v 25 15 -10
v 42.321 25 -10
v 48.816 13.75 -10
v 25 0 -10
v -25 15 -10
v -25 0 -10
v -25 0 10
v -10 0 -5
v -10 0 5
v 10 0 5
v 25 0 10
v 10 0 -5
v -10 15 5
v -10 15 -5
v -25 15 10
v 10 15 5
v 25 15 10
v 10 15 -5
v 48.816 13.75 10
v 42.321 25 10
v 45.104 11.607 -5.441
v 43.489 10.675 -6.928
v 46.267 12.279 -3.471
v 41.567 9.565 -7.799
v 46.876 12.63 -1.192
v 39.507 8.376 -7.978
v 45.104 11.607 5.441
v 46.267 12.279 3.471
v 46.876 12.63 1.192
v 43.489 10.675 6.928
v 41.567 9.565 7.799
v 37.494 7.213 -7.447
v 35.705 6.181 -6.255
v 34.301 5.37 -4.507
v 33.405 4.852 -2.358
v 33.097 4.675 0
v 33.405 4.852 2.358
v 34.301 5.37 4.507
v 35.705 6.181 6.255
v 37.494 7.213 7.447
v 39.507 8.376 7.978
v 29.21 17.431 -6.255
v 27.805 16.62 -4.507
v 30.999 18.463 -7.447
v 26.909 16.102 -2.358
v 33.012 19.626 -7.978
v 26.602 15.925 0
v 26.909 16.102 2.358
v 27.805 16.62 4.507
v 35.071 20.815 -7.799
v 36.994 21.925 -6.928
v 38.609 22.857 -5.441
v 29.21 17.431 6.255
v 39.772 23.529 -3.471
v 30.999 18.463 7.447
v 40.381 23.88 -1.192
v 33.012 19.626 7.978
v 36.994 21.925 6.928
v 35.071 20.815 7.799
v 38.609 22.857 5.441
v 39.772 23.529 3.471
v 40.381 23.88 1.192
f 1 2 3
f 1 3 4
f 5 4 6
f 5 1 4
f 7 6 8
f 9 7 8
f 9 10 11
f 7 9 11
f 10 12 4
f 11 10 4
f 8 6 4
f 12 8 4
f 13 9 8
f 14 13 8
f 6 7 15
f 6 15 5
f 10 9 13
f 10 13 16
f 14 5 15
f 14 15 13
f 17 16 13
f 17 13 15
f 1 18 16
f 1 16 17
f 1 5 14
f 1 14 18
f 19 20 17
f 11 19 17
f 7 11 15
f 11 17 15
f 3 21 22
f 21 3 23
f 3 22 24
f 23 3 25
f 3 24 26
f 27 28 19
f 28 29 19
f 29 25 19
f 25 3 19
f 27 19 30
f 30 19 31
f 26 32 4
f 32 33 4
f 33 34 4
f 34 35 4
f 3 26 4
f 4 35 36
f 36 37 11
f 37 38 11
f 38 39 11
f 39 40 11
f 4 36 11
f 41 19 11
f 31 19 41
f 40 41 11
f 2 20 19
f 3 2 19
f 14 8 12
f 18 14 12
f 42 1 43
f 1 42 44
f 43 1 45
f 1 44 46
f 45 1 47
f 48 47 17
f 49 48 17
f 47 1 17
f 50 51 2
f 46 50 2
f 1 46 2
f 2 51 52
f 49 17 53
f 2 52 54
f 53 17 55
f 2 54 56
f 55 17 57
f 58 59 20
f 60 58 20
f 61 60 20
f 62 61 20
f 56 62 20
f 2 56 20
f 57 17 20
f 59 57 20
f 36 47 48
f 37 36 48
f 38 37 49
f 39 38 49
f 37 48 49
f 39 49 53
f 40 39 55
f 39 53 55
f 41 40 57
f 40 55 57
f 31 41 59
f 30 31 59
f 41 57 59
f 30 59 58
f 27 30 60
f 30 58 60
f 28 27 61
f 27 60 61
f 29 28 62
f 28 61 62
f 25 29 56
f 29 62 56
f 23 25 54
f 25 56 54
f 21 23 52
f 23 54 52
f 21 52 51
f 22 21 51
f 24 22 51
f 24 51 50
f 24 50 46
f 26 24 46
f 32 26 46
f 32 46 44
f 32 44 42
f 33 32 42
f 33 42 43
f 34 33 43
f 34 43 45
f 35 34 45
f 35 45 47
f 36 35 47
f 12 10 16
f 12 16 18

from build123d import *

# Parameters (mm, degrees)
SKETCH_1_W          = 50
SKETCH_1_H          = 20
SKETCH_1_W_2        = 20
SKETCH_1_H_2        = 10
EXTRUDE_1_DEPTH     = 15
EXTRUDE_2_DEPTH     = 20
SKETCH_3_R          = 8
CUT_EXTRUDE_1_DEPTH = 56.775595694


with BuildPart() as part:
    # 草图1 → 凸台-拉伸1 (new body)
    with BuildSketch(Plane(origin=(0, 0, 0), x_dir=(1, 0, 0), z_dir=(0, 1, 0))):
        Rectangle(SKETCH_1_W, SKETCH_1_H)
        Rectangle(SKETCH_1_W_2, SKETCH_1_H_2, mode=Mode.SUBTRACT)
    extrude(amount=EXTRUDE_1_DEPTH)

    # 草图2 → 凸台-拉伸2 (add)
    with BuildSketch(Plane.XY.offset(10)):
        Polygon((25, 15), (42.320508076, 25), (48.815698604, 13.75), (25, 0), align=None)
    extrude(amount=-EXTRUDE_2_DEPTH)

    # 草图3 → 切除-拉伸1 (cut, through all)
    with BuildSketch(Plane(origin=(-0.245190528, 0.424682453, 0), x_dir=(0.8660254037844378, 0.5000000000000017, 0), z_dir=(-0.5000000000000016, 0.8660254037844377, 0))):
        with Locations(Location((39, 0, 0), (0, 0, 180))):
            Circle(SKETCH_3_R)
    extrude(amount=-CUT_EXTRUDE_1_DEPTH, mode=Mode.SUBTRACT)


solid = part.part
